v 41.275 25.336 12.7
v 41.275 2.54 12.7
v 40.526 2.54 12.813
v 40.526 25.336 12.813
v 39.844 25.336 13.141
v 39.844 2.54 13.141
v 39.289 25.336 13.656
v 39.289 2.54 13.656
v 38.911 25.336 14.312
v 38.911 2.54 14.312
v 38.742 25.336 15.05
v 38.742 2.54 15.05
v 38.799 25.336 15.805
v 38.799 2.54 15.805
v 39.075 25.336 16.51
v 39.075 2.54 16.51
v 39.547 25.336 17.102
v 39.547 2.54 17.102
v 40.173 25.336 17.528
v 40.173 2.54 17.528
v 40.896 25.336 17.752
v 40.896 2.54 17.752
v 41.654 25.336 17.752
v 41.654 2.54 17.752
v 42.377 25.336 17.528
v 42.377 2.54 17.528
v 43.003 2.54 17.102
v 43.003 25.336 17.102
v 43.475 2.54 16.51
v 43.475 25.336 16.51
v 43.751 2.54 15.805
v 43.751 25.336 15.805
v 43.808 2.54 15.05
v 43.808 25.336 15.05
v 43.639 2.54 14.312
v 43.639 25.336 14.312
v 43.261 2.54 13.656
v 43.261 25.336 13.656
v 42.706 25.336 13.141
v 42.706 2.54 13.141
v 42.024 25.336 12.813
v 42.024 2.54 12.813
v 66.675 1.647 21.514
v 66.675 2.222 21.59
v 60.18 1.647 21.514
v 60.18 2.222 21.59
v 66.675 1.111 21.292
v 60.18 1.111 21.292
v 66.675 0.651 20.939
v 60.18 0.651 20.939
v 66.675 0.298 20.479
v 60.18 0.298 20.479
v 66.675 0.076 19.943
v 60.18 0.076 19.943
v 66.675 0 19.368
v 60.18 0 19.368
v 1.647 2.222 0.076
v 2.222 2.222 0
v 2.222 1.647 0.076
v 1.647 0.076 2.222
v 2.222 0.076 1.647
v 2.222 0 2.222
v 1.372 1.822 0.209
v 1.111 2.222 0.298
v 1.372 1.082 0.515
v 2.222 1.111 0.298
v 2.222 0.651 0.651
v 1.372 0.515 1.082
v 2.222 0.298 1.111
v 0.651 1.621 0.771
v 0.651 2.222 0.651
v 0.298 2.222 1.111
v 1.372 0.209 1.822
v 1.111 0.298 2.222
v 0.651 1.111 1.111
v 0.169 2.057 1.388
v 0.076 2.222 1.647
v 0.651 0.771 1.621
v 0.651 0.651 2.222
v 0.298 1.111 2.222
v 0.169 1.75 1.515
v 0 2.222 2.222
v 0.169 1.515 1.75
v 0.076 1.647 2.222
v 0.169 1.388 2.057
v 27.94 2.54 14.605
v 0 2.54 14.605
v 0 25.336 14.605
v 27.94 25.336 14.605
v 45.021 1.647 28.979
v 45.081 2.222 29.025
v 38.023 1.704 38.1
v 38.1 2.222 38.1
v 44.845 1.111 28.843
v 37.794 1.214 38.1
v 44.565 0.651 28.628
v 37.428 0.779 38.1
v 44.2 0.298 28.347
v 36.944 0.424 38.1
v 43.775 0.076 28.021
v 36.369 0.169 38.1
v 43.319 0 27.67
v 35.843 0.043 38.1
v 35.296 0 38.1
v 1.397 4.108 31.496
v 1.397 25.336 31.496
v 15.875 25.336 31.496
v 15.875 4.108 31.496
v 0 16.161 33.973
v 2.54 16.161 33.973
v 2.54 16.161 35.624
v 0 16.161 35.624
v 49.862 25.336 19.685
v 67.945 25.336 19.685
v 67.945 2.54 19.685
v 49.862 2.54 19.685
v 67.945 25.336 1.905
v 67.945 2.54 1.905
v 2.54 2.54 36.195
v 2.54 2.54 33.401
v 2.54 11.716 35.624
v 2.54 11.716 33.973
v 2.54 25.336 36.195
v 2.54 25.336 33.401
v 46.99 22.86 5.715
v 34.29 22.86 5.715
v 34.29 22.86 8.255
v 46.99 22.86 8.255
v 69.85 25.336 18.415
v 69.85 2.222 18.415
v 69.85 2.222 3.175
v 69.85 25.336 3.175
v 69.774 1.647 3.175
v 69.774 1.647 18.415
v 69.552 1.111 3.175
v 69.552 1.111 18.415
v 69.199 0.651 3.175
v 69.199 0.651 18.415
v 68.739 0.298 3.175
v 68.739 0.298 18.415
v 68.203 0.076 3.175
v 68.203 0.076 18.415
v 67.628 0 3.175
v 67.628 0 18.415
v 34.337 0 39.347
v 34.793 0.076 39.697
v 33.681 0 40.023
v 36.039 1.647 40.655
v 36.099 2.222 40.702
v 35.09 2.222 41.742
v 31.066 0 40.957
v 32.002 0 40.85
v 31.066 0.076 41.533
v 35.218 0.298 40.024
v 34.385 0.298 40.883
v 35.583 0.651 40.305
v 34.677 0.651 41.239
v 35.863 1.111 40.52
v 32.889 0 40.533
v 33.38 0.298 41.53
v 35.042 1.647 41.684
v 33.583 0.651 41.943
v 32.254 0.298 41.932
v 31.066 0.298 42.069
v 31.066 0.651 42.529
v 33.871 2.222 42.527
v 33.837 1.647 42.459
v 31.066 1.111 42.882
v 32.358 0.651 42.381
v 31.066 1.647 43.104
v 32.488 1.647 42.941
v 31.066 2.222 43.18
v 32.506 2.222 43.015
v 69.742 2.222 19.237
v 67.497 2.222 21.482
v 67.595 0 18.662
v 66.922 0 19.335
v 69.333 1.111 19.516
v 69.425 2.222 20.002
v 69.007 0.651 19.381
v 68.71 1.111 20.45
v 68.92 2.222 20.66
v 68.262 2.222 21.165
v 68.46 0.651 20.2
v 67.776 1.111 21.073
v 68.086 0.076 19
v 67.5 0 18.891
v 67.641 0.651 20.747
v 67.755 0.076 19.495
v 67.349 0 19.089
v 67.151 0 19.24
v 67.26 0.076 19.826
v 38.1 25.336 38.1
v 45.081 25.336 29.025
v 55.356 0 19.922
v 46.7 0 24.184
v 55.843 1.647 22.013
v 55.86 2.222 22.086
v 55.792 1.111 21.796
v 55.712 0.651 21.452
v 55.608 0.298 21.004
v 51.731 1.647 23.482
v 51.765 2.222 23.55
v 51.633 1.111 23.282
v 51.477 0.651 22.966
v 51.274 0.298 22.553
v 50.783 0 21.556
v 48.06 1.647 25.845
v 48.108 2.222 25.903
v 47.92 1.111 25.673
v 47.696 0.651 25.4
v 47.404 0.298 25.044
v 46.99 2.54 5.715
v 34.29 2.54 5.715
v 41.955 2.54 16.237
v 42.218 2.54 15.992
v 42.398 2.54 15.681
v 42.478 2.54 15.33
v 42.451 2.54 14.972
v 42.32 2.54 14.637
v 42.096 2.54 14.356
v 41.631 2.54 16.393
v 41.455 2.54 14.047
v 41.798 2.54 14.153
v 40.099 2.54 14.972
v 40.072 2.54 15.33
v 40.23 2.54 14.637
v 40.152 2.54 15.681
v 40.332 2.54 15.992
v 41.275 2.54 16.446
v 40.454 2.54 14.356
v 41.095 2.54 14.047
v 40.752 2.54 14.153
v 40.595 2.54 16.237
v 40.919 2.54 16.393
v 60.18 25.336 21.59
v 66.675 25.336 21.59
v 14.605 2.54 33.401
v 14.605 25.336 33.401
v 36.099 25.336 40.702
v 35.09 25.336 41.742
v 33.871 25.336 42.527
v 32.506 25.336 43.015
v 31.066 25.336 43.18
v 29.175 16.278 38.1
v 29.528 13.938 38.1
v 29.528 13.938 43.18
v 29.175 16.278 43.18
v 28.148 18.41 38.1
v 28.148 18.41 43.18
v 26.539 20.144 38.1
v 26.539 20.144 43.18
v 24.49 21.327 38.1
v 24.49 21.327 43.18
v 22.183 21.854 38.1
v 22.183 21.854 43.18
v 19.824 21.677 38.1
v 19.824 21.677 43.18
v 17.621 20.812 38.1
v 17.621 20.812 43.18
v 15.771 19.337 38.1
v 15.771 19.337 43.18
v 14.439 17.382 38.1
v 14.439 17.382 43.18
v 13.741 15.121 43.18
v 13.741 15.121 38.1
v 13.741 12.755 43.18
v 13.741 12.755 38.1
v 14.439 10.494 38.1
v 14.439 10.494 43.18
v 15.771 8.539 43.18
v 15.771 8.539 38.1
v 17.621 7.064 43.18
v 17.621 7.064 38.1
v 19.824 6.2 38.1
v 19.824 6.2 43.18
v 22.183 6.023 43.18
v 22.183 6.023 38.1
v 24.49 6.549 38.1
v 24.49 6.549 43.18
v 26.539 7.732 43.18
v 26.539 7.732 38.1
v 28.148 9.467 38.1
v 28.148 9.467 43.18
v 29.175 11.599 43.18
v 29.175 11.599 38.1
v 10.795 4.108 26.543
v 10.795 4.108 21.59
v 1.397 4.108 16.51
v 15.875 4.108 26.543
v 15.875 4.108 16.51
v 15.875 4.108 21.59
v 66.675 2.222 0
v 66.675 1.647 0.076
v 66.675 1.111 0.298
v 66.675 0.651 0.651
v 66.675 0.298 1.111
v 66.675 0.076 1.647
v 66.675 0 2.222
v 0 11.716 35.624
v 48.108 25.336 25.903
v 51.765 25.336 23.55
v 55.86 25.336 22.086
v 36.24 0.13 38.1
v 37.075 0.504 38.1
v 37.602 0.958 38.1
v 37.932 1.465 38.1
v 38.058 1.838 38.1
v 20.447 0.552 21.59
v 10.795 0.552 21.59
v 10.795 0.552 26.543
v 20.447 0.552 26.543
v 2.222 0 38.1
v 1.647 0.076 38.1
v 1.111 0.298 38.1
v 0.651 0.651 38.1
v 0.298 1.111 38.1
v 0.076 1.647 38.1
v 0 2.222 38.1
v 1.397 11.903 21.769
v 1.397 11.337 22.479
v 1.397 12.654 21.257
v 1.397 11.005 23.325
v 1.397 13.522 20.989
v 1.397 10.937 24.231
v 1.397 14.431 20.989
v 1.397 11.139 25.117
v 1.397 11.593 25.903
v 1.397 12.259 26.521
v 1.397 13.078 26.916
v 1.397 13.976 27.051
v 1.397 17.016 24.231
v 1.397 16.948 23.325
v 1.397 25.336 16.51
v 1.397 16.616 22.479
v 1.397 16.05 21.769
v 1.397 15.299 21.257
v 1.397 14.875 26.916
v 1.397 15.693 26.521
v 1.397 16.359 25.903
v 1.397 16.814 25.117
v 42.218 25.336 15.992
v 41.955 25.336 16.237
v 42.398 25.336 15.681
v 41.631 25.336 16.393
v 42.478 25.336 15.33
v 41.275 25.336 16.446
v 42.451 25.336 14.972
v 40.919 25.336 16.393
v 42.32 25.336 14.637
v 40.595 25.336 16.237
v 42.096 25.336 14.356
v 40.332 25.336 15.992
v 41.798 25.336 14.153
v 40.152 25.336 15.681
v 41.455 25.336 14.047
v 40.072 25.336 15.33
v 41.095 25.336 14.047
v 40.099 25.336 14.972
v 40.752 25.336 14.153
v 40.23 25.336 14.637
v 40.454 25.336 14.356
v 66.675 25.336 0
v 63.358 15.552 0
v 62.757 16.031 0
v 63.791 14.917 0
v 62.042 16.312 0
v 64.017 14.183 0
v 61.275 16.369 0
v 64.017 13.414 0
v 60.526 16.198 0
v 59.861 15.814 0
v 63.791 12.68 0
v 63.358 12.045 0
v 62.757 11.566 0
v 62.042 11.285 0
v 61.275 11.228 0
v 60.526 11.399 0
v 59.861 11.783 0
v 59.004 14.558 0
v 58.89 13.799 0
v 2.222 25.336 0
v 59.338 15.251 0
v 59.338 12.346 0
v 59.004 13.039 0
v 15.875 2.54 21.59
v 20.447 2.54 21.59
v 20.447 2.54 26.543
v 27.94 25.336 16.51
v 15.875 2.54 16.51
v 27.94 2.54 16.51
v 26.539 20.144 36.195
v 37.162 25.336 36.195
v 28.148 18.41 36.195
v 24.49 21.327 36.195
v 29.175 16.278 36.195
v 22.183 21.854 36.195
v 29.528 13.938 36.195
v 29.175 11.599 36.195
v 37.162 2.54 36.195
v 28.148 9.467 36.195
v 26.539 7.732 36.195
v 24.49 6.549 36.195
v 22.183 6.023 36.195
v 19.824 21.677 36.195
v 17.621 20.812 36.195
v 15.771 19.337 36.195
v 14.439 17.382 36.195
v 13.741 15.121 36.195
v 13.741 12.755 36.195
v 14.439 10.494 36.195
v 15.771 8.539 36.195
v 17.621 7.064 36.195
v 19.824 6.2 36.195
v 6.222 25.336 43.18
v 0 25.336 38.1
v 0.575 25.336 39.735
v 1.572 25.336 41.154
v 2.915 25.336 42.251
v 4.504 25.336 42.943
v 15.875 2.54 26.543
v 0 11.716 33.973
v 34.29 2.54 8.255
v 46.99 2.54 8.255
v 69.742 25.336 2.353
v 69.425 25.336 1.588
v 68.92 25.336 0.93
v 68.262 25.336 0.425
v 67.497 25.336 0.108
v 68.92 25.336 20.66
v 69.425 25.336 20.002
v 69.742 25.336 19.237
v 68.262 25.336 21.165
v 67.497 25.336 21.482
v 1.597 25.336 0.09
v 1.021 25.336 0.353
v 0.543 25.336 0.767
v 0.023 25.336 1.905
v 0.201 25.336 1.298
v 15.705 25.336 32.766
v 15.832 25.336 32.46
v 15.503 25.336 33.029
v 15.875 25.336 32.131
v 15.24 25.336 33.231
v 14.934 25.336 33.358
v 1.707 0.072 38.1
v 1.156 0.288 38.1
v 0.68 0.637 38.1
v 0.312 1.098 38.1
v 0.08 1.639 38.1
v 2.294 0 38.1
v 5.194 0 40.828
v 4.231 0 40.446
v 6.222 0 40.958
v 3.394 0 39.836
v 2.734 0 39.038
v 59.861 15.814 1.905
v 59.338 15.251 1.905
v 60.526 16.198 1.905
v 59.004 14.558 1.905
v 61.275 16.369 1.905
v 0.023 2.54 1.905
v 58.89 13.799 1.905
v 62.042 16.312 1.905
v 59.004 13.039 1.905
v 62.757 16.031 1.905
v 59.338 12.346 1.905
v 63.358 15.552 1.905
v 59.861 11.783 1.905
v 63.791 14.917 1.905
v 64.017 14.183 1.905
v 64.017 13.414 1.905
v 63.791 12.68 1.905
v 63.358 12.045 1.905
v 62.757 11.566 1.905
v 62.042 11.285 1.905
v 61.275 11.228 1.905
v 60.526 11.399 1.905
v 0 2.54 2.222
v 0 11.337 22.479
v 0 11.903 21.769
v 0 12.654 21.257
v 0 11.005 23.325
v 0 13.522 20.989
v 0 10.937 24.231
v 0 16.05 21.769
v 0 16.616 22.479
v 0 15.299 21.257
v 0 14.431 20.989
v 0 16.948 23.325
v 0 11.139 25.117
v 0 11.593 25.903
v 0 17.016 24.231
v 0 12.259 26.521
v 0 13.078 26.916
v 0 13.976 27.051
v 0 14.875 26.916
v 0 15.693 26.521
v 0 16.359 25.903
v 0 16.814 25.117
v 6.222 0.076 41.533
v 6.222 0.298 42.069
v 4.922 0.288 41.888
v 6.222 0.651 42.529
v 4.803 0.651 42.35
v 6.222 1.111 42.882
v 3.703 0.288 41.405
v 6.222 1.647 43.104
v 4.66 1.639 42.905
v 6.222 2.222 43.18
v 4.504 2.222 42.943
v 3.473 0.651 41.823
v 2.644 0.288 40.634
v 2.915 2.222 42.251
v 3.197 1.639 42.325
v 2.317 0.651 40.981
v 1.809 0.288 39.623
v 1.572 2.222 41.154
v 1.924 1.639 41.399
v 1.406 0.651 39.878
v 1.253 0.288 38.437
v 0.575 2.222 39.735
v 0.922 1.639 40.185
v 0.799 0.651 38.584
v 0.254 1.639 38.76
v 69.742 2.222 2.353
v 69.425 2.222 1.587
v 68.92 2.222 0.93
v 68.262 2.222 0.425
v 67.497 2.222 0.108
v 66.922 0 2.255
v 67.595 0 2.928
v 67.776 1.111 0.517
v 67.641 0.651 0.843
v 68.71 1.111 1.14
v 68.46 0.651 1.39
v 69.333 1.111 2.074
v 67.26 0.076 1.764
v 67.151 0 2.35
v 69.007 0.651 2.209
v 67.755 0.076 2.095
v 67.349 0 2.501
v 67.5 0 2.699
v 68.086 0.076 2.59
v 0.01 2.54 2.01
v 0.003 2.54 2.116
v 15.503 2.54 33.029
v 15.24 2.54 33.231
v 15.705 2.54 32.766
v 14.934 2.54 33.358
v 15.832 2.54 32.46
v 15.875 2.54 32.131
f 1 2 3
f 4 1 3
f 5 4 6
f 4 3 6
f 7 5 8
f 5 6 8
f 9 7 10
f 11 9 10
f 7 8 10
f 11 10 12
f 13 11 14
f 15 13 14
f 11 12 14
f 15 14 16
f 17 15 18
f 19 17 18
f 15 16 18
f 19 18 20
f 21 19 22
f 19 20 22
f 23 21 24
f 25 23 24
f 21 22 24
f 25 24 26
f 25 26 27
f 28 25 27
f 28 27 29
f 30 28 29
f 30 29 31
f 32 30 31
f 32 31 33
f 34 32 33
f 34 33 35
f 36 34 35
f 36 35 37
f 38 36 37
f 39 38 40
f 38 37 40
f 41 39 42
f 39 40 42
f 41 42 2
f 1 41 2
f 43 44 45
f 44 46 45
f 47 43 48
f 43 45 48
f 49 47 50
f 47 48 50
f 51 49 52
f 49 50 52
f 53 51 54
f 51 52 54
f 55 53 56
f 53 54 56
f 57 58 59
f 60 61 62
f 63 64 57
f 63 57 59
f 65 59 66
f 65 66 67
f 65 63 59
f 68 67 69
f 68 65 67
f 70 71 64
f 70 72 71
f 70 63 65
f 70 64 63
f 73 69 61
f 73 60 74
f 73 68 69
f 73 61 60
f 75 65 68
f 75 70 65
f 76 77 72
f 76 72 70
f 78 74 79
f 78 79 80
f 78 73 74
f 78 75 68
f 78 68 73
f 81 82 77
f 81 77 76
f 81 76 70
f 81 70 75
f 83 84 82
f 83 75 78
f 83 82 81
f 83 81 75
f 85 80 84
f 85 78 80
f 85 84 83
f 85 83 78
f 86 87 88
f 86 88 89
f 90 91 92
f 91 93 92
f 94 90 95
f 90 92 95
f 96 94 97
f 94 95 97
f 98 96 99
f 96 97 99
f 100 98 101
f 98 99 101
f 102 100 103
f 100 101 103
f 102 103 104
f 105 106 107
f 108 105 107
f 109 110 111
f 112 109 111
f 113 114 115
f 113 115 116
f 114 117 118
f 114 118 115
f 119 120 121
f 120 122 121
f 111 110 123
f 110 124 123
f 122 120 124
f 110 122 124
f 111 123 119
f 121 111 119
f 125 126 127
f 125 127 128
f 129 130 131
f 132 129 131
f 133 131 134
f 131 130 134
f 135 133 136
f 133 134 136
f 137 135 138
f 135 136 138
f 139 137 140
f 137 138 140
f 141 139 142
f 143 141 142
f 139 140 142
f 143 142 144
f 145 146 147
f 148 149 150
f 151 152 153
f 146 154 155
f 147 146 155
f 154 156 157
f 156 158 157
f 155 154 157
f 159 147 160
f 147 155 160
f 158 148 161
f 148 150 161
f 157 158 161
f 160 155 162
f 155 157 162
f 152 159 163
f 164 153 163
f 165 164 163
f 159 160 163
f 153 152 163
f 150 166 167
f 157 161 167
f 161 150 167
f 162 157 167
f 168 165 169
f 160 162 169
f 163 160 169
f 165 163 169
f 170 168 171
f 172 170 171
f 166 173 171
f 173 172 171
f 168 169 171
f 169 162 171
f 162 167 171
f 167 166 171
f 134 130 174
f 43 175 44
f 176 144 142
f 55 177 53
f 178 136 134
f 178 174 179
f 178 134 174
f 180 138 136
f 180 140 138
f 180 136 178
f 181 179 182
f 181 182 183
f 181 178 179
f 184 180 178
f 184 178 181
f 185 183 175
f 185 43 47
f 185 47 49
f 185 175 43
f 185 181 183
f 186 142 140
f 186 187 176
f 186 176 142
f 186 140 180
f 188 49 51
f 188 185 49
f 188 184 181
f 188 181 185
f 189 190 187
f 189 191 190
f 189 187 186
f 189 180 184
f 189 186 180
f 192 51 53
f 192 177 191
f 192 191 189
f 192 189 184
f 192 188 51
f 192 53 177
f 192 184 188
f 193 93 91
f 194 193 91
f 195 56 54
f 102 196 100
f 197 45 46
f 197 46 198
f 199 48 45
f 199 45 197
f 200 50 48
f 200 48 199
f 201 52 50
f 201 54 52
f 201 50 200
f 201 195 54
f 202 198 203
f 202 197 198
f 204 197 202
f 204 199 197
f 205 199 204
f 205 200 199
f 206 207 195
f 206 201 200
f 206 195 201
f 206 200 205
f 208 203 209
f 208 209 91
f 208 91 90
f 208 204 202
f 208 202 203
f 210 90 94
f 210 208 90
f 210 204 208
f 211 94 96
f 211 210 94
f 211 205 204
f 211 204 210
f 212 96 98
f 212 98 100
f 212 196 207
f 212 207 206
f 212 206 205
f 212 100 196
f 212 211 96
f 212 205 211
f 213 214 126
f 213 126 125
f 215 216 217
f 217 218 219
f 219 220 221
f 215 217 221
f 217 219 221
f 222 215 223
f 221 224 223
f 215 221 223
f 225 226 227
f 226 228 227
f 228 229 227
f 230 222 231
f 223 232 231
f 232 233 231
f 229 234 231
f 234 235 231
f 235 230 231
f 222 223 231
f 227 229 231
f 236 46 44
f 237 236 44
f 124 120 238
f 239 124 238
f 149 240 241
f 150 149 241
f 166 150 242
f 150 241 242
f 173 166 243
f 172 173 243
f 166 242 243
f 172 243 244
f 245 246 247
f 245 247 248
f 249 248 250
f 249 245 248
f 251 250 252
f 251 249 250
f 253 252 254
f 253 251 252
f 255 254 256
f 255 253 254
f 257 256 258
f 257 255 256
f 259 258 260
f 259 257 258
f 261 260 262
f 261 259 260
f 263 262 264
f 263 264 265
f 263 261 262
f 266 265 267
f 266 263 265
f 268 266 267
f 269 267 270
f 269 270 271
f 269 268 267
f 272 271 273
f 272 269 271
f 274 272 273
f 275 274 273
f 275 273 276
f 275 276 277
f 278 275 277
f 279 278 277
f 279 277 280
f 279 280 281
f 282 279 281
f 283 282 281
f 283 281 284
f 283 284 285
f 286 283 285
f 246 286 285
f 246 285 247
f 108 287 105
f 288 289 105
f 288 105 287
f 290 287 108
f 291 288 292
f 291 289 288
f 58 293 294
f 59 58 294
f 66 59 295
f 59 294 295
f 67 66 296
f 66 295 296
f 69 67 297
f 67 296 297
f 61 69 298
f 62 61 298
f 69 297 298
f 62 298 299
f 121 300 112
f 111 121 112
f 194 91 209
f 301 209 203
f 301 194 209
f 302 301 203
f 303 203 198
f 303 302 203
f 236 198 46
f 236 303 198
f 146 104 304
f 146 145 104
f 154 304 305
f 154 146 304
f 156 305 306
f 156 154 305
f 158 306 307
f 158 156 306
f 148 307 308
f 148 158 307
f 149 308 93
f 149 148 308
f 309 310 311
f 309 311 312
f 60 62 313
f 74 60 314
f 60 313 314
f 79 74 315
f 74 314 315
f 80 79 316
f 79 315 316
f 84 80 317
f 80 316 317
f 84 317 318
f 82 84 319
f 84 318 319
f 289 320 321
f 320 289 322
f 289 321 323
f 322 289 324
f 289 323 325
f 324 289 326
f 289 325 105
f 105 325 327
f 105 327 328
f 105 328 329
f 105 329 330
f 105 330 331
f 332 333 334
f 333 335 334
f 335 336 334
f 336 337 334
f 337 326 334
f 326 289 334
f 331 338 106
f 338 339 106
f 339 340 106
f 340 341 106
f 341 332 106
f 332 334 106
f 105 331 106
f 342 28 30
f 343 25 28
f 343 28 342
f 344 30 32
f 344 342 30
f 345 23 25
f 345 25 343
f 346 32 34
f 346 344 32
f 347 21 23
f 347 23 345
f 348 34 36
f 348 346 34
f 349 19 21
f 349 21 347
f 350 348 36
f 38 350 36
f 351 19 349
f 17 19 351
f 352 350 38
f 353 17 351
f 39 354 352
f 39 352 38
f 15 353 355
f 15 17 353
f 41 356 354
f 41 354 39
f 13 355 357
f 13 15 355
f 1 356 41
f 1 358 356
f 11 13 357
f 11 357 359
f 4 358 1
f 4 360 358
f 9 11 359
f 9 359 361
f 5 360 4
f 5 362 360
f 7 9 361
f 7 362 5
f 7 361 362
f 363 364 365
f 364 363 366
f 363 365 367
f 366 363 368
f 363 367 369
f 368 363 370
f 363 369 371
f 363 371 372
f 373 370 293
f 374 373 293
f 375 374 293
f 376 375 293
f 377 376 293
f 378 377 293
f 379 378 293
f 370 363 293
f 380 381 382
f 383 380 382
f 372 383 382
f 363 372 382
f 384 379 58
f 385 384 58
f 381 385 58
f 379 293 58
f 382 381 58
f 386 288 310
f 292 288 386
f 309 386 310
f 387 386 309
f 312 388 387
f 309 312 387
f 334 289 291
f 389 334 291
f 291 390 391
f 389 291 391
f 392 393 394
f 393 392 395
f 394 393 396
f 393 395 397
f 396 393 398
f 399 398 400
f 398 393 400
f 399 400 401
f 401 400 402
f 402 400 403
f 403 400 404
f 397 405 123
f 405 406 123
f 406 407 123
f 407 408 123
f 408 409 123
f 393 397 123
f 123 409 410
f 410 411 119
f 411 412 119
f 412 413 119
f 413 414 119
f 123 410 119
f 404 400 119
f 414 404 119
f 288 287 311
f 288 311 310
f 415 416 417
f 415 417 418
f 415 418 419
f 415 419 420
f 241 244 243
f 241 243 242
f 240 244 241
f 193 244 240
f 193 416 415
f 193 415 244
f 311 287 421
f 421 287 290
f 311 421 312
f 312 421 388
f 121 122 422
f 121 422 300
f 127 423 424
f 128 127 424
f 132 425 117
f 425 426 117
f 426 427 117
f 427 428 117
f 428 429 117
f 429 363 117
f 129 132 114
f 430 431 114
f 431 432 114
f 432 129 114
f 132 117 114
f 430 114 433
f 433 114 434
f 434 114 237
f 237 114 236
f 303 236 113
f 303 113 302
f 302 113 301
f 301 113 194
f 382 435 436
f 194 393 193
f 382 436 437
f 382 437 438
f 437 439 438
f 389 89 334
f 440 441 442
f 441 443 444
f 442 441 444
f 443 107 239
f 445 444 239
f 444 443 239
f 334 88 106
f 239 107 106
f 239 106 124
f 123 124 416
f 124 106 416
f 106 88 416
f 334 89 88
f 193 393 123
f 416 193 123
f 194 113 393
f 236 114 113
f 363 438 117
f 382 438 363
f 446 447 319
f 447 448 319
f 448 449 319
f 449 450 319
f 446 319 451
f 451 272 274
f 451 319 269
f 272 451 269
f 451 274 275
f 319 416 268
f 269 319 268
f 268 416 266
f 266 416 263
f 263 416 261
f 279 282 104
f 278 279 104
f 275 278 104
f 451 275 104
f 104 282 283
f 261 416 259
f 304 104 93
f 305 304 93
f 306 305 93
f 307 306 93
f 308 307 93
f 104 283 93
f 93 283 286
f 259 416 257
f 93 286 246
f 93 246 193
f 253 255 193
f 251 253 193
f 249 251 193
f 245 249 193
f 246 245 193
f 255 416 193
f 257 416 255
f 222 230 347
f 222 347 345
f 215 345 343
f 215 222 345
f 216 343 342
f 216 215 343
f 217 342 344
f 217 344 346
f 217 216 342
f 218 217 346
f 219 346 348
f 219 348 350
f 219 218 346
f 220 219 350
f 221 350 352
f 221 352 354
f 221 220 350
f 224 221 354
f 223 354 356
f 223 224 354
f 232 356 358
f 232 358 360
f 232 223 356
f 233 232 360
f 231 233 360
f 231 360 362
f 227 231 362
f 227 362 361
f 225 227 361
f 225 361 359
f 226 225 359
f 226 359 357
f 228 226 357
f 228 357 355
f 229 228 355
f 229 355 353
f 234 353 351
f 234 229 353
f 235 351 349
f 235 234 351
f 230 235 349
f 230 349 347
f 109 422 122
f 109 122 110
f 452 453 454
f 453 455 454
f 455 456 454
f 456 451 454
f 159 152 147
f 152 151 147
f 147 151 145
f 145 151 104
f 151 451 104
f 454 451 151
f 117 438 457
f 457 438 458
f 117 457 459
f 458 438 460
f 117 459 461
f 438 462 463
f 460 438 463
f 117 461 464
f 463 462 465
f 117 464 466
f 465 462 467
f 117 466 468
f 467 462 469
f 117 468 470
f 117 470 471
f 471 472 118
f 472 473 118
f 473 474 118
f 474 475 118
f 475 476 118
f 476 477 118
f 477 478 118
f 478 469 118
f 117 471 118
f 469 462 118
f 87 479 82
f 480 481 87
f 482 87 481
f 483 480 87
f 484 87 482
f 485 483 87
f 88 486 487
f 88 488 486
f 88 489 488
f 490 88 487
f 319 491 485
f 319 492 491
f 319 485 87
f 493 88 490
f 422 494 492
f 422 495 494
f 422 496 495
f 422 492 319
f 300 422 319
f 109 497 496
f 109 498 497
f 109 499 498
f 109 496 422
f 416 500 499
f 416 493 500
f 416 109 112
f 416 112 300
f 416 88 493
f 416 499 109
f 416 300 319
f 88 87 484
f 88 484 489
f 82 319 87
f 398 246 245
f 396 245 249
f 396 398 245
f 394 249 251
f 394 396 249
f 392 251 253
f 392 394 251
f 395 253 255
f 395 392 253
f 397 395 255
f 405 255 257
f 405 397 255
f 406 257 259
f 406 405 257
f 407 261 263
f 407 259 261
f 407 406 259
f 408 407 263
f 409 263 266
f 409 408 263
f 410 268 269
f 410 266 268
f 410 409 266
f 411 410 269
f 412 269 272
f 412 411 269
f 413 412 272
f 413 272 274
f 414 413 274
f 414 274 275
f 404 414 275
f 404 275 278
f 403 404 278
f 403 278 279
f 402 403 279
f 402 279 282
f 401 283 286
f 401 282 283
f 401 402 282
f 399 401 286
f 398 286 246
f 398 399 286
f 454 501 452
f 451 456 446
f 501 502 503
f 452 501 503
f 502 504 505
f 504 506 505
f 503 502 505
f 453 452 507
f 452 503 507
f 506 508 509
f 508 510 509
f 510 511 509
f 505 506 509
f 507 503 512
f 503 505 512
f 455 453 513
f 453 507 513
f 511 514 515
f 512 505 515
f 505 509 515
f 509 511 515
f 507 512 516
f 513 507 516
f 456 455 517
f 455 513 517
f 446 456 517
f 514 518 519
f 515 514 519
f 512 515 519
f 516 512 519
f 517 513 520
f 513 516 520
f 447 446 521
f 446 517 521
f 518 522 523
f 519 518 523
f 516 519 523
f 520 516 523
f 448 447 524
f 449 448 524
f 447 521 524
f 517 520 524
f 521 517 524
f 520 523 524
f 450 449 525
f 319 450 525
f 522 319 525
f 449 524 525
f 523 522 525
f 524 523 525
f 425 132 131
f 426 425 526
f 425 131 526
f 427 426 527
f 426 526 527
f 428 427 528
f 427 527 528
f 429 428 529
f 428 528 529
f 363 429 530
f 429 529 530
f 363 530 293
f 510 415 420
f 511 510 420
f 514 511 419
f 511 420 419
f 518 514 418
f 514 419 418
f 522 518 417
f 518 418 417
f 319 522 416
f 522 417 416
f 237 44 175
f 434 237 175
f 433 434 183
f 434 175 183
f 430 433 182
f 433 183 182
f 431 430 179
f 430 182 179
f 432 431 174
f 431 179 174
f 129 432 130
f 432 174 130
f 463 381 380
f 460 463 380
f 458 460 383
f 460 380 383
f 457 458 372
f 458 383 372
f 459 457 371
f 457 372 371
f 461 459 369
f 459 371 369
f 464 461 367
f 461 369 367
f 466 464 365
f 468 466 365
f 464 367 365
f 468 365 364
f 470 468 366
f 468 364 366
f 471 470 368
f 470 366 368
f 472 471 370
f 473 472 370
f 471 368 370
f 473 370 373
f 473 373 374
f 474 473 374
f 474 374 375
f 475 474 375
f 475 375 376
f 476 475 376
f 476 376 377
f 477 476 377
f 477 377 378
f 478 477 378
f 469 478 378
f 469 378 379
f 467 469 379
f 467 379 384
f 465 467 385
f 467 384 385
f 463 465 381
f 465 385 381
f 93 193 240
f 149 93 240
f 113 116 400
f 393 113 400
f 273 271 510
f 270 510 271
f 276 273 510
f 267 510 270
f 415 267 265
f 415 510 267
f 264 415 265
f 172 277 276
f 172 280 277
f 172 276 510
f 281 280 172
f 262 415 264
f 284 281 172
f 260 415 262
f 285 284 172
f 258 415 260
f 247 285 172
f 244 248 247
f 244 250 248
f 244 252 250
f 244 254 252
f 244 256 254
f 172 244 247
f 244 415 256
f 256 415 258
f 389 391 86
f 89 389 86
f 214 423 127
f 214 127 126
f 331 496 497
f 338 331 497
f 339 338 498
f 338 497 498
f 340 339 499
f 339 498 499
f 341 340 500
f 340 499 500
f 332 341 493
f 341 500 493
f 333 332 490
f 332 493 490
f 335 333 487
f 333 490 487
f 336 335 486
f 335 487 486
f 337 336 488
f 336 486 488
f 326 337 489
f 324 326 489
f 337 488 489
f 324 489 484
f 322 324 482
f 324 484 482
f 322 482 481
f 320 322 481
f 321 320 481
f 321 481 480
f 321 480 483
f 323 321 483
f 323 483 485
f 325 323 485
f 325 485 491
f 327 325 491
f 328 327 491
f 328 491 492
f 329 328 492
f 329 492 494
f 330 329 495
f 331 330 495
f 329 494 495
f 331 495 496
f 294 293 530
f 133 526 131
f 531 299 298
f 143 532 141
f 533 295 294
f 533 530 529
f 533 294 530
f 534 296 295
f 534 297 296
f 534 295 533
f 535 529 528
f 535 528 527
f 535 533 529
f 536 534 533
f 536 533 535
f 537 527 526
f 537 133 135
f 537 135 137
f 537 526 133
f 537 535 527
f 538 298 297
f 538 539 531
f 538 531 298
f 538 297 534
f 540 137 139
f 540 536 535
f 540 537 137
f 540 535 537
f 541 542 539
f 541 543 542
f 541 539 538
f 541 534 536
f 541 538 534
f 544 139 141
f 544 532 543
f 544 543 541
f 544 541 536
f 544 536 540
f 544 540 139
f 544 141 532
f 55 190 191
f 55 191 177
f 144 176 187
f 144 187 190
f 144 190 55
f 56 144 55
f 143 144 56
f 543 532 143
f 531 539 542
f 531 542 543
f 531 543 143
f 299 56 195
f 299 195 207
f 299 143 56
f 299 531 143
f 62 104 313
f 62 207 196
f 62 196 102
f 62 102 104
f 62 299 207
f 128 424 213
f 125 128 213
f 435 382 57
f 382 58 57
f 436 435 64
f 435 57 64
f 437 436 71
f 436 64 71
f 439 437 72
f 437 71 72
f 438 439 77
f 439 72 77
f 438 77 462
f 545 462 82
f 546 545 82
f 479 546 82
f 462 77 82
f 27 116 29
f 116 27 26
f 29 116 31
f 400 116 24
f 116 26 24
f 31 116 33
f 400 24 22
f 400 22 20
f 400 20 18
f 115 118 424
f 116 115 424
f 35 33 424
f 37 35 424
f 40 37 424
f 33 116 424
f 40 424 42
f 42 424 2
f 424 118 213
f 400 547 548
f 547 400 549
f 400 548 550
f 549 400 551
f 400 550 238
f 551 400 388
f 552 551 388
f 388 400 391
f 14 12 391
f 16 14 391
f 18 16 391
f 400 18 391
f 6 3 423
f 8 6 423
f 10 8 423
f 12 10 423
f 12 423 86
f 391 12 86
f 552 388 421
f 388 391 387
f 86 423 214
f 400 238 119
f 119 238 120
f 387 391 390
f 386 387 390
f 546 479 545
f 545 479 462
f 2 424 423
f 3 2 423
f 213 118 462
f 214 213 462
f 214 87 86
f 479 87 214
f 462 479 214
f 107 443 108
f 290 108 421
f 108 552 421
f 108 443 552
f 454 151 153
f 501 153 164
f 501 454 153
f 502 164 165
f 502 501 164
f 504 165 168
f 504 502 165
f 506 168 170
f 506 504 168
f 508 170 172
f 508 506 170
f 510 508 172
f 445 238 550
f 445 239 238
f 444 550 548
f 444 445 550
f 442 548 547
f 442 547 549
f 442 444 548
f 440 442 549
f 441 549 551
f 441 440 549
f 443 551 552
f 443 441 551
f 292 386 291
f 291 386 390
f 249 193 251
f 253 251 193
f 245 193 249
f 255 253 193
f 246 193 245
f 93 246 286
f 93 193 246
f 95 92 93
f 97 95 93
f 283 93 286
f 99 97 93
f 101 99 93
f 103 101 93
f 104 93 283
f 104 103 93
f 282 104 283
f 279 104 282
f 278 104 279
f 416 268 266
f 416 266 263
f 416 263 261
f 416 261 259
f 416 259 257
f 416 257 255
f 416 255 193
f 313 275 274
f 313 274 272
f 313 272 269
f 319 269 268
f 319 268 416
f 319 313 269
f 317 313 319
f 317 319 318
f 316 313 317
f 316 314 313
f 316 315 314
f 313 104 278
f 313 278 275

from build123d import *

# Parameters (mm, degrees)
BOSS_EXTRUDE1_DEPTH = 2.54
BOSS_EXTRUDE2_DEPTH = 22.7965
SKETCH3_W           = 27.94
SKETCH3_H           = 1.905
SKETCH3_W_2         = 15.875
BOSS_EXTRUDE3_DEPTH = 22.7965
SKETCH4_W           = 2.794
SKETCH4_H           = 22.7965
SKETCH4_W_2         = 1.651
SKETCH4_H_2         = 4.445
BOSS_EXTRUDE4_DEPTH = 2.54
FILLET5_R           = 1.27
SKETCH6_W           = 38.1
SKETCH6_H           = 5.08
BOSS_EXTRUDE5_DEPTH = 25.3365
CUT_EXTRUDE1_START  = -6.985
SKETCH7_R           = 7.9375
CUT_EXTRUDE1_DEPTH  = 6.985
CUT_EXTRUDE2_DEPTH  = 86.938775487
SKETCH10_R          = 2.54
SKETCH10_R_2        = 1.2065
BOSS_EXTRUDE6_DEPTH = 22.7965
FILLET6_R           = 19.05
FILLET7_R           = 6.35
FILLET8_R           = 3.175
FILLET9_R           = 2.2225
FILLET10_R          = 2.2225
FILLET11_R          = 2.2225
SKETCH11_W          = 15.875
SKETCH11_H          = 14.986
BOSS_EXTRUDE7_DEPTH = 1.56845
SKETCH12_W          = 14.986
SKETCH12_H          = 21.22805
SKETCH12_R          = 3.048
BOSS_EXTRUDE8_DEPTH = 1.397
SKETCH14_R          = 2.5781
CUT_EXTRUDE3_DEPTH  = 1.905
SKETCH15_W          = 12.7
SKETCH15_H          = 2.54
BOSS_EXTRUDE9_DEPTH = 20.32
SKETCH16_W          = 9.652
SKETCH16_H          = 4.953
CUT_EXTRUDE4_DEPTH  = 3.556


with BuildPart() as part:
    # Sketch1 → Boss-Extrude1 (new body)
    with BuildSketch(Plane(origin=(0, 0, 0), x_dir=(1, 0, 0), z_dir=(0, 1, 0))):
        Polygon((0, 0), (69.85, 0), (69.85, -21.59), (50.8, -21.59), (38.1, -38.1), (0, -38.1), align=None)
    extrude(amount=BOSS_EXTRUDE1_DEPTH)

    # Sketch2 → Boss-Extrude2 (add)
    with BuildSketch(Plane(origin=(0, 2.54, 0), x_dir=(1, 0, 0), z_dir=(0, 1, 0))):
        Polygon((0, 0), (0, -1.905), (67.945, -1.905), (67.945, -19.685), (49.861975147, -19.685), (37.161975147, -36.195), (0, -36.195), (0, -38.1), (38.1, -38.1), (50.8, -21.59), (69.85, -21.59), (69.85, 0), align=None)
    extrude(amount=BOSS_EXTRUDE2_DEPTH)

    # Sketch3 → Boss-Extrude3 (add)
    with BuildSketch(Plane(origin=(0, 2.54, 0), x_dir=(1, 0, 0), z_dir=(0, 1, 0))):
        with Locations((13.97, -15.5575)):
            Rectangle(SKETCH3_W, SKETCH3_H)
        with Locations((7.9375, -32.4485)):
            Rectangle(SKETCH3_W_2, SKETCH3_H)
    extrude(amount=BOSS_EXTRUDE3_DEPTH)

    # Sketch4 → Boss-Extrude4 (add)
    with BuildSketch(Plane.ZY):
        with Locations((34.798, 13.93825)):
            Rectangle(SKETCH4_W, SKETCH4_H)
        with Locations((34.798, 13.93825)):
            Rectangle(SKETCH4_W_2, SKETCH4_H_2, mode=Mode.SUBTRACT)
    extrude(amount=-BOSS_EXTRUDE4_DEPTH)

    # Fillet5
    fillet5_edges = [part.edges().sort_by_distance(p)[0] for p in [
        (15.875, 13.93825, 33.401),
    ]]
    fillet(fillet5_edges, radius=FILLET5_R)


with BuildPart() as body_2:
    # Sketch6 → Boss-Extrude5 (new body)
    with BuildSketch(Plane(origin=(0, 25.3365, 0), x_dir=(1, 0, 0), z_dir=(0, 1, 0))):
        with Locations((19.05, -40.64)):
            Rectangle(SKETCH6_W, SKETCH6_H)
    extrude(amount=-BOSS_EXTRUDE5_DEPTH)


with BuildPart() as cut_extrude1_tool:
    # Sketch7 → Cut-Extrude1 (new body)
    with BuildSketch(Plane.XY.offset(43.18).offset(CUT_EXTRUDE1_START)):
        with Locations((21.59, 13.93825)):
            Circle(SKETCH7_R)
    extrude(amount=CUT_EXTRUDE1_DEPTH)


with BuildPart() as part_1:
    add(part.part)

    # Cut-Extrude1: cut by cut_extrude1_tool
    add(cut_extrude1_tool.part, mode=Mode.SUBTRACT)

    # Sketch10 → Boss-Extrude6 (add)
    with BuildSketch(Plane(origin=(0, 2.54, 0), x_dir=(1, 0, 0), z_dir=(0, 1, 0))):
        with Locations(Location((41.275, -15.24, 0), (0, 0, 90))):
            Circle(SKETCH10_R)
        with Locations(Location((41.275, -15.24, 0), (0, 0, 270))):
            Circle(SKETCH10_R_2, mode=Mode.SUBTRACT)
    extrude(amount=BOSS_EXTRUDE6_DEPTH)

    # Fillet6
    fillet6_edges = [part_1.edges().sort_by_distance(p)[0] for p in [
        (50.8, 12.66825, 21.59),
    ]]
    fillet(fillet6_edges, radius=FILLET6_R)

    # Fillet8
    fillet8_edges = [part_1.edges().sort_by_distance(p)[0] for p in [
        (69.85, 12.66825, 0),
        (69.85, 12.66825, 21.59),
    ]]
    fillet(fillet8_edges, radius=FILLET8_R)

    # Fillet9
    fillet9_edges = [part_1.edges().sort_by_distance(p)[0] for p in [
        (63.427624263, 0, 21.59),
        (51.764877453, 0, 23.549533953),
        (69.85, 0, 10.795),
        (33.3375, 0, 0),
        (68.92006403, 0, 0.92993597),
        (68.92006403, 0, 20.66006403),
        (41.590380767, 0, 33.562505003),
    ]]
    fillet(fillet9_edges, radius=FILLET9_R)

    # Fillet11
    fillet11_edges = [part_1.edges().sort_by_distance(p)[0] for p in [
        (0, 13.7795, 0),
        (0, 0.650955179, 0.650955179),
        (0, 0, 20.16125),
    ]]
    fillet(fillet11_edges, radius=FILLET11_R)

    # Sketch11 → Boss-Extrude7 (add)
    with BuildSketch(Plane(origin=(0, 2.54, 0), x_dir=(1, 0, 0), z_dir=(0, 1, 0))):
        with Locations((7.9375, -24.003)):
            Rectangle(SKETCH11_W, SKETCH11_H)
    extrude(amount=BOSS_EXTRUDE7_DEPTH)

    # Sketch12 → Boss-Extrude8 (add)
    with BuildSketch(Plane.ZY):
        with Locations((24.003, 14.722475)):
            Rectangle(SKETCH12_W, SKETCH12_H)
        with Locations((24.003, 13.97635)):
            Circle(SKETCH12_R, mode=Mode.SUBTRACT)
    extrude(amount=-BOSS_EXTRUDE8_DEPTH)

    # Sketch14 → Cut-Extrude3 (cut)
    with BuildSketch(Plane(origin=(0, 0, 0), x_dir=(-1, 0, 0), z_dir=(0, 0, -1))):
        with Locations((-61.468, 13.798556219)):
            Circle(SKETCH14_R)
    extrude(amount=-CUT_EXTRUDE3_DEPTH, mode=Mode.SUBTRACT)

    # Sketch15 → Boss-Extrude9 (add)
    with BuildSketch(Plane(origin=(0, 2.54, 0), x_dir=(1, 0, 0), z_dir=(0, 1, 0))):
        with Locations((40.64, -6.985)):
            Rectangle(SKETCH15_W, SKETCH15_H)
    extrude(amount=BOSS_EXTRUDE9_DEPTH)

    # Sketch16 → Cut-Extrude4 (cut)
    with BuildSketch(Plane(origin=(0, 4.10845, 0), x_dir=(1, 0, 0), z_dir=(0, 1, 0))):
        with Locations((15.621, -24.0665)):
            Rectangle(SKETCH16_W, SKETCH16_H)
    extrude(amount=-CUT_EXTRUDE4_DEPTH, mode=Mode.SUBTRACT)


with BuildPart() as body_2_1:
    add(body_2.part)

    # Cut-Extrude1: cut by cut_extrude1_tool
    add(cut_extrude1_tool.part, mode=Mode.SUBTRACT)

    # Sketch9 → Cut-Extrude2 (cut, through all)
    with BuildSketch(Plane(origin=(0, 25.3365, 0), x_dir=(1, 0, 0), z_dir=(0, 1, 0))):
        Polygon((38.1, -38.1), (34.192307692, -43.18), (38.1, -43.18), align=None)
    extrude(amount=-CUT_EXTRUDE2_DEPTH, mode=Mode.SUBTRACT)

    # Fillet7
    # the kernel refuses this fillet: 6.35 mm, written as the material it takes off along each edge
    with BuildSketch(Plane(origin=(0, 40.890759867, 43.18), x_dir=(1.5737716562133841e-12, 0, -1.0), z_dir=(0, -1, 0))) as fillet7_piece_1:
        with BuildLine():
            CenterArc((6.35, 6.221703947), FILLET7_R, 180, 78.463040967)
            Line((0, 6.221703947), (-0.127, 6.221703947))
            Line((-0.127, 6.221703947), (-0.127, 0))
            Line((-0.127, 0), (0, -0.127))
            ThreePointArc((0, -0.127), (2.54, -0.127), (5.0546, -0.124434079))
            Line((5.0546, -0.124434079), (5.08, 0))
        make_face()
    extrude(amount=56.445019733, mode=Mode.SUBTRACT)
    with BuildSketch(Plane(origin=(34.192307692, 33.153373772, 43.18), x_dir=(0.6097107608496929, 0, -0.7926239891045996), z_dir=(0, -1, 0))) as fillet7_piece_2:
        with BuildLine():
            CenterArc((FILLET7_R * 0.492401497451, -FILLET7_R), FILLET7_R, 90, 52.431407971)
            Line((-FILLET7_R * 0.300222491654, -FILLET7_R * 0.39028923915), (-FILLET7_R * 0.316074971436, -FILLET7_R * 0.378095023933))
            Line((-FILLET7_R * 0.316074971436, -FILLET7_R * 0.378095023933), (-FILLET7_R * 0.00984802994901, FILLET7_R * 0.02))
            Line((-FILLET7_R * 0.00984802994901, FILLET7_R * 0.02), (FILLET7_R * 0.492401497451, FILLET7_R * 0.02))
            Line((FILLET7_R * 0.492401497451, FILLET7_R * 0.02), (FILLET7_R * 0.492401497451, 0))
        make_face()
    extrude(amount=40.970247544, mode=Mode.SUBTRACT)

    # Fillet10
    fillet10_edges = [body_2_1.edges().sort_by_distance(p)[0] for p in [
        (37.099360257, 0, 39.400831666),
        (18.643631065, 0, 43.18),
        (33.870681875, 0, 42.526822016),
        (2.205611318, 0, 41.74868885),
    ]]
    fillet(fillet10_edges, radius=FILLET10_R)


solid = Compound([part_1.part, body_2_1.part])
